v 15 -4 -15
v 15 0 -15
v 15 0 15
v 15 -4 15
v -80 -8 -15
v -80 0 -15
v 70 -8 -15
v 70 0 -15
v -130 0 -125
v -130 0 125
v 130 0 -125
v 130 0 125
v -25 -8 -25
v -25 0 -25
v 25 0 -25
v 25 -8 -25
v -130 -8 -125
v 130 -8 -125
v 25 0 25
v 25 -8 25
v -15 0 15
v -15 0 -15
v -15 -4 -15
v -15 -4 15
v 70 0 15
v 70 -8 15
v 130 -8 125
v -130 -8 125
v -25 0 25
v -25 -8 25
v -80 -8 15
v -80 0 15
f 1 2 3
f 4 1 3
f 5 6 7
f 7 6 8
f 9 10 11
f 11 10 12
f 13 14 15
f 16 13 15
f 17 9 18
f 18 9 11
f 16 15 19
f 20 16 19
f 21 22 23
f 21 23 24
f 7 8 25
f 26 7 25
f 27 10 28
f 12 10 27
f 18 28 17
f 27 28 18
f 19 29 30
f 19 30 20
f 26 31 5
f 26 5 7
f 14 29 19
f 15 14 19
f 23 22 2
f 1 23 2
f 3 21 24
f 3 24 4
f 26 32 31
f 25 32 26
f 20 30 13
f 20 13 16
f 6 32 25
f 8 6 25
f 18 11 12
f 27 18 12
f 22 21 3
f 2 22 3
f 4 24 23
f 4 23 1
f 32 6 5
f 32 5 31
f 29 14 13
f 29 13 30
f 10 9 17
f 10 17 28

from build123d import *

# Parameters (mm, degrees)
F0_W     = 260
F0_H     = 250
F1_DEPTH = 8
F2_W     = 30
F2_H     = 30
F3_DEPTH = 4
F4_W     = 50
F4_H     = 50
F5_DEPTH = 8
F6_W     = 150
F6_H     = 30
F7_DEPTH = 8


with BuildPart() as f1:
    # F0 (on Front) → F1 (new body)
    with BuildSketch(Plane.XZ):
        Rectangle(F0_W, F0_H)
    extrude(amount=F1_DEPTH)


with BuildPart() as f3:
    # F2 (on Front) → F3 (new body)
    with BuildSketch(Plane.XZ):
        Rectangle(F2_W, F2_H)
    extrude(amount=F3_DEPTH)


with BuildPart() as f5:
    # F4 (on Front) → F5 (new body)
    with BuildSketch(Plane.XZ):
        Rectangle(F4_W, F4_H)
    extrude(amount=F5_DEPTH)


with BuildPart() as f7:
    # F6 (on Front) → F7 (new body)
    with BuildSketch(Plane.XZ):
        with Locations((-5, 0)):
            Rectangle(F6_W, F6_H)
    extrude(amount=F7_DEPTH)


solid = Compound([f1.part, f3.part, f5.part, f7.part])
